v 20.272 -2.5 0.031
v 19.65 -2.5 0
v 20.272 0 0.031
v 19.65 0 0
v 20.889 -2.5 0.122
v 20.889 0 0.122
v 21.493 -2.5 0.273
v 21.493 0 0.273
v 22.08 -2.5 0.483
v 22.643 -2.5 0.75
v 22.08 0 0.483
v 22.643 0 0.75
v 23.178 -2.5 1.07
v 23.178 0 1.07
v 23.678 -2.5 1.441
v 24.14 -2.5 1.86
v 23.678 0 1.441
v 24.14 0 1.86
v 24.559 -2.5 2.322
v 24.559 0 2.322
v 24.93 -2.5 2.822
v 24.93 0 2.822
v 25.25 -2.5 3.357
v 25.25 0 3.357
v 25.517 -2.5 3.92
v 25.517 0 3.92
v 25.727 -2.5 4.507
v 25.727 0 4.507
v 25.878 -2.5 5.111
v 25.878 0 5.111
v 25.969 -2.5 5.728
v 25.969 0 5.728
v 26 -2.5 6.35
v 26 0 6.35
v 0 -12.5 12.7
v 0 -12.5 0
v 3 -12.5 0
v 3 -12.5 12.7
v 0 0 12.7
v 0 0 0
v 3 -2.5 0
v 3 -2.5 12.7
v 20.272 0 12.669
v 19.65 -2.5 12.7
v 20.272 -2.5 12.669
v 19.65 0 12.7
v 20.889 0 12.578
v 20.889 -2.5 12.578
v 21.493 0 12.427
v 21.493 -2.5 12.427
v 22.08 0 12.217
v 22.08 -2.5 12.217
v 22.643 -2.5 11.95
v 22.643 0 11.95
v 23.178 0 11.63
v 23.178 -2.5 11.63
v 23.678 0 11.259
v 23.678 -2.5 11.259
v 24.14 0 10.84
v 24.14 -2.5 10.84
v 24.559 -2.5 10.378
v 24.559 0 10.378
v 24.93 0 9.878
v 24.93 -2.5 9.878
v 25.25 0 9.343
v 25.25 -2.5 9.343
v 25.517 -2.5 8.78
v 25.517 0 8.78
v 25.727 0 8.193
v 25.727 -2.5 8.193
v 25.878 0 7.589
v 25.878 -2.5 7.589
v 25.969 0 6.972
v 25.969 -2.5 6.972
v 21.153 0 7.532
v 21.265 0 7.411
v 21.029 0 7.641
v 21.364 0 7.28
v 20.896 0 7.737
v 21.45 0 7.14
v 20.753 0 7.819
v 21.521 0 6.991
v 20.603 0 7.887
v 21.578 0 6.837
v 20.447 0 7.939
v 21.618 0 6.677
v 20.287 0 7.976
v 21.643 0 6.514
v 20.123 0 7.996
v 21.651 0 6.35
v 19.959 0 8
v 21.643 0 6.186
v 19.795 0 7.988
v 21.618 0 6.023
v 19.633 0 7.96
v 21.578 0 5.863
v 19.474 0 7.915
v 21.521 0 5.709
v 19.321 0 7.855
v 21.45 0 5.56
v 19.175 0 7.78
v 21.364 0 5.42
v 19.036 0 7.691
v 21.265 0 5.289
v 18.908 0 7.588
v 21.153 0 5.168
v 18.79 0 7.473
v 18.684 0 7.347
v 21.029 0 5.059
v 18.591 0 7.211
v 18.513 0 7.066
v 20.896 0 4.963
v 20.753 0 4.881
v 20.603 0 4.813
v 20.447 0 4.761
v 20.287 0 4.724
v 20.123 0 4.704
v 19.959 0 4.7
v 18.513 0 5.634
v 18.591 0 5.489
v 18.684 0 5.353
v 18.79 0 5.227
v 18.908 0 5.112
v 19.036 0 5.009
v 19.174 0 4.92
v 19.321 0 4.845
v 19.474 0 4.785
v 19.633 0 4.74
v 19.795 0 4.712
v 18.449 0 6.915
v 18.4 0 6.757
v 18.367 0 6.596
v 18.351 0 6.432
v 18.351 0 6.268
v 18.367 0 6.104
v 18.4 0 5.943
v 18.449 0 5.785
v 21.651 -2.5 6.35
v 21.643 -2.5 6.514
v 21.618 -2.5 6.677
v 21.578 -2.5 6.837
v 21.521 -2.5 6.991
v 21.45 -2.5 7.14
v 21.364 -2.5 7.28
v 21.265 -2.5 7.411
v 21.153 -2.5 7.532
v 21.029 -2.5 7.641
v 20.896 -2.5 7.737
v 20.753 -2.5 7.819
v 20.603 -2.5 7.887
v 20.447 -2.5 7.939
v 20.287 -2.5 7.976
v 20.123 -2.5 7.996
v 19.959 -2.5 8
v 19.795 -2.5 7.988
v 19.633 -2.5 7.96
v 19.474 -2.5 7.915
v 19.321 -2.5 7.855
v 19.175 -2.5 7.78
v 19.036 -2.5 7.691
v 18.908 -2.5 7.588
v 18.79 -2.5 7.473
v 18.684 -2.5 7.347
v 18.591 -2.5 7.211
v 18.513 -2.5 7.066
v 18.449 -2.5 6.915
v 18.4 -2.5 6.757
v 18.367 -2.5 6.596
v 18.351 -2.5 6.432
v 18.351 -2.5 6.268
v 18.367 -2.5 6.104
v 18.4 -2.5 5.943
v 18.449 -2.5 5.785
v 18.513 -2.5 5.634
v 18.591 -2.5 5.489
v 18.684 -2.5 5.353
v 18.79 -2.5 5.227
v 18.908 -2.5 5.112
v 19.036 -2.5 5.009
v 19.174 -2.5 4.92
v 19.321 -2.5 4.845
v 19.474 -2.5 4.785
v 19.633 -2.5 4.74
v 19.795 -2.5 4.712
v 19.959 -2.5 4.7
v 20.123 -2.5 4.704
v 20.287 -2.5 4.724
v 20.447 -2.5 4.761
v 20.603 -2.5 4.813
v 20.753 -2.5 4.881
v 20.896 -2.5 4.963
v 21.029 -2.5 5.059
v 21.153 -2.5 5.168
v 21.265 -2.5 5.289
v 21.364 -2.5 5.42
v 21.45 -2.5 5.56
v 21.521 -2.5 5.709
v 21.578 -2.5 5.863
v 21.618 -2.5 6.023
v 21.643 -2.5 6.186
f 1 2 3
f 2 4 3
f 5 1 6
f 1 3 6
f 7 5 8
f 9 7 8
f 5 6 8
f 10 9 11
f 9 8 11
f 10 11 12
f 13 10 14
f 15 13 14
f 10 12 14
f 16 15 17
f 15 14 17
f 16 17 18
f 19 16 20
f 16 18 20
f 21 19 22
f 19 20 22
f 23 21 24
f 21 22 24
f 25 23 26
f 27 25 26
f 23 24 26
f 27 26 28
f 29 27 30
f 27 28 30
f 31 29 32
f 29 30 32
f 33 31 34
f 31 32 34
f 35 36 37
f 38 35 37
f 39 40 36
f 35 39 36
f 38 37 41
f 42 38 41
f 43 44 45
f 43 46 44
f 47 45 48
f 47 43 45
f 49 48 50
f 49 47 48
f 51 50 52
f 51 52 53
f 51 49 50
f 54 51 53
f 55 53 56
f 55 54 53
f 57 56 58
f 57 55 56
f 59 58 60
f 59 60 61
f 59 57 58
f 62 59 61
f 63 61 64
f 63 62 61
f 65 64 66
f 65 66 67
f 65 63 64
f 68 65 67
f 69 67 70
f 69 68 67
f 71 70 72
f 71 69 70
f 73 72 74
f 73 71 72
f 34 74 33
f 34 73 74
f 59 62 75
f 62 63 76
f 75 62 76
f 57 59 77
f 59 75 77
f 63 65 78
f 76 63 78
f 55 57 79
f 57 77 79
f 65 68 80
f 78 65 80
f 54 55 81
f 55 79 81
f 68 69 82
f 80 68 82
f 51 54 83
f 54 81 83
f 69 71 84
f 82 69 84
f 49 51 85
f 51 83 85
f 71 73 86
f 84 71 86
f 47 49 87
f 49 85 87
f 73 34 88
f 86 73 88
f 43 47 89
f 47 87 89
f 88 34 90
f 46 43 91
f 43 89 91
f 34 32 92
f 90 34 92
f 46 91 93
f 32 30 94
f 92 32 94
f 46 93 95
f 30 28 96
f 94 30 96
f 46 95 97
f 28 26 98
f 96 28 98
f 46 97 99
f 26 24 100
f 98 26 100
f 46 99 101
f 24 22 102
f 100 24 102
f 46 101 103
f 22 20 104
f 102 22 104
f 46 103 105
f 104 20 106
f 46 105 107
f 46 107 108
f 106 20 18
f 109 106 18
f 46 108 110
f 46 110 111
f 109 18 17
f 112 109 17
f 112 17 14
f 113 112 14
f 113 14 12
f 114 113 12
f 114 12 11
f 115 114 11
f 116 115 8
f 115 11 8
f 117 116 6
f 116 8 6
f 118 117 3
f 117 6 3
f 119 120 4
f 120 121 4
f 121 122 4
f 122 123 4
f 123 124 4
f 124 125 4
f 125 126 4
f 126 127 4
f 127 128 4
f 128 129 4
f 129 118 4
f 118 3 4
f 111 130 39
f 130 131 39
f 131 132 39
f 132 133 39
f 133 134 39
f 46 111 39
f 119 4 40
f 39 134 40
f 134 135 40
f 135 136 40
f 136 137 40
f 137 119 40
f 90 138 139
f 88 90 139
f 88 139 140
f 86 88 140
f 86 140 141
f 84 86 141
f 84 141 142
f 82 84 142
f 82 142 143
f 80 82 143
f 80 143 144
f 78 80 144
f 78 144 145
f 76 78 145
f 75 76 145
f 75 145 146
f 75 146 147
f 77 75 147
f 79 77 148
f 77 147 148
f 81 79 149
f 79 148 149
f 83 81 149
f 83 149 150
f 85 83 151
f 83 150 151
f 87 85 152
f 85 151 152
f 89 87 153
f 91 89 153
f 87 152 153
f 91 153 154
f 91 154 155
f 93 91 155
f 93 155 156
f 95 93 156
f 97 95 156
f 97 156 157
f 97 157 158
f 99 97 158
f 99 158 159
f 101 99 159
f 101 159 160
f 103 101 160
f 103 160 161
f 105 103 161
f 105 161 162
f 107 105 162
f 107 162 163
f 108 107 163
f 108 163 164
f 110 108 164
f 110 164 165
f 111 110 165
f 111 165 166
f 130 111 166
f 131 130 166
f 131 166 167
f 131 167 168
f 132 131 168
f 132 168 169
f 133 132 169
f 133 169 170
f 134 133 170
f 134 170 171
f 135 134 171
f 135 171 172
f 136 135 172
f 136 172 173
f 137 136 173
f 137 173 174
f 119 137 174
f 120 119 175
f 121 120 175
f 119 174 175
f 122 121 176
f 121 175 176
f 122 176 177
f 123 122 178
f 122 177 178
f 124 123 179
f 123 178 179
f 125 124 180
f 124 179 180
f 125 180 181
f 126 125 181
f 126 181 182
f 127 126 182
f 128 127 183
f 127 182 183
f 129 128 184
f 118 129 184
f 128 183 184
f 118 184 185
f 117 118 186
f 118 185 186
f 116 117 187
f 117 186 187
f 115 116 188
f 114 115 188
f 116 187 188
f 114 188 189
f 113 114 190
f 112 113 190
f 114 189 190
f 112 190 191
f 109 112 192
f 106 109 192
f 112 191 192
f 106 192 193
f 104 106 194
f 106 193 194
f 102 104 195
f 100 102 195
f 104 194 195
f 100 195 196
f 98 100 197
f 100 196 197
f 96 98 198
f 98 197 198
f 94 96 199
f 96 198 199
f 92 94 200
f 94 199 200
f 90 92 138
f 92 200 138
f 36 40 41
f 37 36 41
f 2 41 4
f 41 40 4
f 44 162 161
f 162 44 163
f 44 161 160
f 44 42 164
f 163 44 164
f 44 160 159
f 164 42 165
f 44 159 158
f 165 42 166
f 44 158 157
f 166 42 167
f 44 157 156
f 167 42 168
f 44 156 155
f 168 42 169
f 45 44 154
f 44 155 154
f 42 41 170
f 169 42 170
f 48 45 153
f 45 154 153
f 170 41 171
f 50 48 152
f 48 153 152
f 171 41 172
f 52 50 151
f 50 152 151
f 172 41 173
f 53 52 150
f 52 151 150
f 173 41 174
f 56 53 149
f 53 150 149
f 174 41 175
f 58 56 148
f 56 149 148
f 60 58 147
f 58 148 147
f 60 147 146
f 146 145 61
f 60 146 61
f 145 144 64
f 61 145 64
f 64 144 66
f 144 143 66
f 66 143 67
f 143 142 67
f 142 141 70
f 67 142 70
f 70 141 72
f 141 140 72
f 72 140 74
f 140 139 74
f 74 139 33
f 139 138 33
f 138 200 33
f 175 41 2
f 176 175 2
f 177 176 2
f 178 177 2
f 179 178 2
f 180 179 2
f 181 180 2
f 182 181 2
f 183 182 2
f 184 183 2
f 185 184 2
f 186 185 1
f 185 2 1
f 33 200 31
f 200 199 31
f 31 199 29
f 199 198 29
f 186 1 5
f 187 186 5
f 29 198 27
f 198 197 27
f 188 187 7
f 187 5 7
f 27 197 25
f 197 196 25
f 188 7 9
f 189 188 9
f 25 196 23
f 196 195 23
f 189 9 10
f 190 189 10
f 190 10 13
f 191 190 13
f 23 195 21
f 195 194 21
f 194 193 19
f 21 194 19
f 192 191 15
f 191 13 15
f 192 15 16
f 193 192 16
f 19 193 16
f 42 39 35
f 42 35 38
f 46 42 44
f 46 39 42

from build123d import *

# Parameters (mm, degrees)
F1_DEPTH = 12.7
F2_R     = 1.651
F3_DEPTH = 3.175
F4_R     = 6.34999


# Not quite as in the source:
# - a fillet or chamfer is up to 0.001 mm smaller than in the source, because OpenCascade refuses the exact size


with BuildPart() as f1:
    # F0 (on Top) → F1 (new body)
    with BuildSketch(Plane.XY):
        Polygon((0, -12.5), (3, -12.5), (3, -2.5), (26, -2.5), (26, 0), (0, 0), align=None)
    extrude(amount=F1_DEPTH)

    # F2 (on face) → F3 (cut)
    with BuildSketch(Plane.XZ.offset(2.5)):
        with Locations((20, 6.35)):
            Circle(F2_R)
    extrude(amount=-F3_DEPTH, mode=Mode.SUBTRACT)

    # F4 (radius 6.35 in the source; OpenCascade refuses exactly that, so slightly less here)
    f4_edges = [f1.edges().sort_by_distance(p)[0] for p in [
        (26, -1.25, 12.7),
        (26, -1.25, 0),
    ]]
    fillet(f4_edges, radius=F4_R)


solid = f1.part
